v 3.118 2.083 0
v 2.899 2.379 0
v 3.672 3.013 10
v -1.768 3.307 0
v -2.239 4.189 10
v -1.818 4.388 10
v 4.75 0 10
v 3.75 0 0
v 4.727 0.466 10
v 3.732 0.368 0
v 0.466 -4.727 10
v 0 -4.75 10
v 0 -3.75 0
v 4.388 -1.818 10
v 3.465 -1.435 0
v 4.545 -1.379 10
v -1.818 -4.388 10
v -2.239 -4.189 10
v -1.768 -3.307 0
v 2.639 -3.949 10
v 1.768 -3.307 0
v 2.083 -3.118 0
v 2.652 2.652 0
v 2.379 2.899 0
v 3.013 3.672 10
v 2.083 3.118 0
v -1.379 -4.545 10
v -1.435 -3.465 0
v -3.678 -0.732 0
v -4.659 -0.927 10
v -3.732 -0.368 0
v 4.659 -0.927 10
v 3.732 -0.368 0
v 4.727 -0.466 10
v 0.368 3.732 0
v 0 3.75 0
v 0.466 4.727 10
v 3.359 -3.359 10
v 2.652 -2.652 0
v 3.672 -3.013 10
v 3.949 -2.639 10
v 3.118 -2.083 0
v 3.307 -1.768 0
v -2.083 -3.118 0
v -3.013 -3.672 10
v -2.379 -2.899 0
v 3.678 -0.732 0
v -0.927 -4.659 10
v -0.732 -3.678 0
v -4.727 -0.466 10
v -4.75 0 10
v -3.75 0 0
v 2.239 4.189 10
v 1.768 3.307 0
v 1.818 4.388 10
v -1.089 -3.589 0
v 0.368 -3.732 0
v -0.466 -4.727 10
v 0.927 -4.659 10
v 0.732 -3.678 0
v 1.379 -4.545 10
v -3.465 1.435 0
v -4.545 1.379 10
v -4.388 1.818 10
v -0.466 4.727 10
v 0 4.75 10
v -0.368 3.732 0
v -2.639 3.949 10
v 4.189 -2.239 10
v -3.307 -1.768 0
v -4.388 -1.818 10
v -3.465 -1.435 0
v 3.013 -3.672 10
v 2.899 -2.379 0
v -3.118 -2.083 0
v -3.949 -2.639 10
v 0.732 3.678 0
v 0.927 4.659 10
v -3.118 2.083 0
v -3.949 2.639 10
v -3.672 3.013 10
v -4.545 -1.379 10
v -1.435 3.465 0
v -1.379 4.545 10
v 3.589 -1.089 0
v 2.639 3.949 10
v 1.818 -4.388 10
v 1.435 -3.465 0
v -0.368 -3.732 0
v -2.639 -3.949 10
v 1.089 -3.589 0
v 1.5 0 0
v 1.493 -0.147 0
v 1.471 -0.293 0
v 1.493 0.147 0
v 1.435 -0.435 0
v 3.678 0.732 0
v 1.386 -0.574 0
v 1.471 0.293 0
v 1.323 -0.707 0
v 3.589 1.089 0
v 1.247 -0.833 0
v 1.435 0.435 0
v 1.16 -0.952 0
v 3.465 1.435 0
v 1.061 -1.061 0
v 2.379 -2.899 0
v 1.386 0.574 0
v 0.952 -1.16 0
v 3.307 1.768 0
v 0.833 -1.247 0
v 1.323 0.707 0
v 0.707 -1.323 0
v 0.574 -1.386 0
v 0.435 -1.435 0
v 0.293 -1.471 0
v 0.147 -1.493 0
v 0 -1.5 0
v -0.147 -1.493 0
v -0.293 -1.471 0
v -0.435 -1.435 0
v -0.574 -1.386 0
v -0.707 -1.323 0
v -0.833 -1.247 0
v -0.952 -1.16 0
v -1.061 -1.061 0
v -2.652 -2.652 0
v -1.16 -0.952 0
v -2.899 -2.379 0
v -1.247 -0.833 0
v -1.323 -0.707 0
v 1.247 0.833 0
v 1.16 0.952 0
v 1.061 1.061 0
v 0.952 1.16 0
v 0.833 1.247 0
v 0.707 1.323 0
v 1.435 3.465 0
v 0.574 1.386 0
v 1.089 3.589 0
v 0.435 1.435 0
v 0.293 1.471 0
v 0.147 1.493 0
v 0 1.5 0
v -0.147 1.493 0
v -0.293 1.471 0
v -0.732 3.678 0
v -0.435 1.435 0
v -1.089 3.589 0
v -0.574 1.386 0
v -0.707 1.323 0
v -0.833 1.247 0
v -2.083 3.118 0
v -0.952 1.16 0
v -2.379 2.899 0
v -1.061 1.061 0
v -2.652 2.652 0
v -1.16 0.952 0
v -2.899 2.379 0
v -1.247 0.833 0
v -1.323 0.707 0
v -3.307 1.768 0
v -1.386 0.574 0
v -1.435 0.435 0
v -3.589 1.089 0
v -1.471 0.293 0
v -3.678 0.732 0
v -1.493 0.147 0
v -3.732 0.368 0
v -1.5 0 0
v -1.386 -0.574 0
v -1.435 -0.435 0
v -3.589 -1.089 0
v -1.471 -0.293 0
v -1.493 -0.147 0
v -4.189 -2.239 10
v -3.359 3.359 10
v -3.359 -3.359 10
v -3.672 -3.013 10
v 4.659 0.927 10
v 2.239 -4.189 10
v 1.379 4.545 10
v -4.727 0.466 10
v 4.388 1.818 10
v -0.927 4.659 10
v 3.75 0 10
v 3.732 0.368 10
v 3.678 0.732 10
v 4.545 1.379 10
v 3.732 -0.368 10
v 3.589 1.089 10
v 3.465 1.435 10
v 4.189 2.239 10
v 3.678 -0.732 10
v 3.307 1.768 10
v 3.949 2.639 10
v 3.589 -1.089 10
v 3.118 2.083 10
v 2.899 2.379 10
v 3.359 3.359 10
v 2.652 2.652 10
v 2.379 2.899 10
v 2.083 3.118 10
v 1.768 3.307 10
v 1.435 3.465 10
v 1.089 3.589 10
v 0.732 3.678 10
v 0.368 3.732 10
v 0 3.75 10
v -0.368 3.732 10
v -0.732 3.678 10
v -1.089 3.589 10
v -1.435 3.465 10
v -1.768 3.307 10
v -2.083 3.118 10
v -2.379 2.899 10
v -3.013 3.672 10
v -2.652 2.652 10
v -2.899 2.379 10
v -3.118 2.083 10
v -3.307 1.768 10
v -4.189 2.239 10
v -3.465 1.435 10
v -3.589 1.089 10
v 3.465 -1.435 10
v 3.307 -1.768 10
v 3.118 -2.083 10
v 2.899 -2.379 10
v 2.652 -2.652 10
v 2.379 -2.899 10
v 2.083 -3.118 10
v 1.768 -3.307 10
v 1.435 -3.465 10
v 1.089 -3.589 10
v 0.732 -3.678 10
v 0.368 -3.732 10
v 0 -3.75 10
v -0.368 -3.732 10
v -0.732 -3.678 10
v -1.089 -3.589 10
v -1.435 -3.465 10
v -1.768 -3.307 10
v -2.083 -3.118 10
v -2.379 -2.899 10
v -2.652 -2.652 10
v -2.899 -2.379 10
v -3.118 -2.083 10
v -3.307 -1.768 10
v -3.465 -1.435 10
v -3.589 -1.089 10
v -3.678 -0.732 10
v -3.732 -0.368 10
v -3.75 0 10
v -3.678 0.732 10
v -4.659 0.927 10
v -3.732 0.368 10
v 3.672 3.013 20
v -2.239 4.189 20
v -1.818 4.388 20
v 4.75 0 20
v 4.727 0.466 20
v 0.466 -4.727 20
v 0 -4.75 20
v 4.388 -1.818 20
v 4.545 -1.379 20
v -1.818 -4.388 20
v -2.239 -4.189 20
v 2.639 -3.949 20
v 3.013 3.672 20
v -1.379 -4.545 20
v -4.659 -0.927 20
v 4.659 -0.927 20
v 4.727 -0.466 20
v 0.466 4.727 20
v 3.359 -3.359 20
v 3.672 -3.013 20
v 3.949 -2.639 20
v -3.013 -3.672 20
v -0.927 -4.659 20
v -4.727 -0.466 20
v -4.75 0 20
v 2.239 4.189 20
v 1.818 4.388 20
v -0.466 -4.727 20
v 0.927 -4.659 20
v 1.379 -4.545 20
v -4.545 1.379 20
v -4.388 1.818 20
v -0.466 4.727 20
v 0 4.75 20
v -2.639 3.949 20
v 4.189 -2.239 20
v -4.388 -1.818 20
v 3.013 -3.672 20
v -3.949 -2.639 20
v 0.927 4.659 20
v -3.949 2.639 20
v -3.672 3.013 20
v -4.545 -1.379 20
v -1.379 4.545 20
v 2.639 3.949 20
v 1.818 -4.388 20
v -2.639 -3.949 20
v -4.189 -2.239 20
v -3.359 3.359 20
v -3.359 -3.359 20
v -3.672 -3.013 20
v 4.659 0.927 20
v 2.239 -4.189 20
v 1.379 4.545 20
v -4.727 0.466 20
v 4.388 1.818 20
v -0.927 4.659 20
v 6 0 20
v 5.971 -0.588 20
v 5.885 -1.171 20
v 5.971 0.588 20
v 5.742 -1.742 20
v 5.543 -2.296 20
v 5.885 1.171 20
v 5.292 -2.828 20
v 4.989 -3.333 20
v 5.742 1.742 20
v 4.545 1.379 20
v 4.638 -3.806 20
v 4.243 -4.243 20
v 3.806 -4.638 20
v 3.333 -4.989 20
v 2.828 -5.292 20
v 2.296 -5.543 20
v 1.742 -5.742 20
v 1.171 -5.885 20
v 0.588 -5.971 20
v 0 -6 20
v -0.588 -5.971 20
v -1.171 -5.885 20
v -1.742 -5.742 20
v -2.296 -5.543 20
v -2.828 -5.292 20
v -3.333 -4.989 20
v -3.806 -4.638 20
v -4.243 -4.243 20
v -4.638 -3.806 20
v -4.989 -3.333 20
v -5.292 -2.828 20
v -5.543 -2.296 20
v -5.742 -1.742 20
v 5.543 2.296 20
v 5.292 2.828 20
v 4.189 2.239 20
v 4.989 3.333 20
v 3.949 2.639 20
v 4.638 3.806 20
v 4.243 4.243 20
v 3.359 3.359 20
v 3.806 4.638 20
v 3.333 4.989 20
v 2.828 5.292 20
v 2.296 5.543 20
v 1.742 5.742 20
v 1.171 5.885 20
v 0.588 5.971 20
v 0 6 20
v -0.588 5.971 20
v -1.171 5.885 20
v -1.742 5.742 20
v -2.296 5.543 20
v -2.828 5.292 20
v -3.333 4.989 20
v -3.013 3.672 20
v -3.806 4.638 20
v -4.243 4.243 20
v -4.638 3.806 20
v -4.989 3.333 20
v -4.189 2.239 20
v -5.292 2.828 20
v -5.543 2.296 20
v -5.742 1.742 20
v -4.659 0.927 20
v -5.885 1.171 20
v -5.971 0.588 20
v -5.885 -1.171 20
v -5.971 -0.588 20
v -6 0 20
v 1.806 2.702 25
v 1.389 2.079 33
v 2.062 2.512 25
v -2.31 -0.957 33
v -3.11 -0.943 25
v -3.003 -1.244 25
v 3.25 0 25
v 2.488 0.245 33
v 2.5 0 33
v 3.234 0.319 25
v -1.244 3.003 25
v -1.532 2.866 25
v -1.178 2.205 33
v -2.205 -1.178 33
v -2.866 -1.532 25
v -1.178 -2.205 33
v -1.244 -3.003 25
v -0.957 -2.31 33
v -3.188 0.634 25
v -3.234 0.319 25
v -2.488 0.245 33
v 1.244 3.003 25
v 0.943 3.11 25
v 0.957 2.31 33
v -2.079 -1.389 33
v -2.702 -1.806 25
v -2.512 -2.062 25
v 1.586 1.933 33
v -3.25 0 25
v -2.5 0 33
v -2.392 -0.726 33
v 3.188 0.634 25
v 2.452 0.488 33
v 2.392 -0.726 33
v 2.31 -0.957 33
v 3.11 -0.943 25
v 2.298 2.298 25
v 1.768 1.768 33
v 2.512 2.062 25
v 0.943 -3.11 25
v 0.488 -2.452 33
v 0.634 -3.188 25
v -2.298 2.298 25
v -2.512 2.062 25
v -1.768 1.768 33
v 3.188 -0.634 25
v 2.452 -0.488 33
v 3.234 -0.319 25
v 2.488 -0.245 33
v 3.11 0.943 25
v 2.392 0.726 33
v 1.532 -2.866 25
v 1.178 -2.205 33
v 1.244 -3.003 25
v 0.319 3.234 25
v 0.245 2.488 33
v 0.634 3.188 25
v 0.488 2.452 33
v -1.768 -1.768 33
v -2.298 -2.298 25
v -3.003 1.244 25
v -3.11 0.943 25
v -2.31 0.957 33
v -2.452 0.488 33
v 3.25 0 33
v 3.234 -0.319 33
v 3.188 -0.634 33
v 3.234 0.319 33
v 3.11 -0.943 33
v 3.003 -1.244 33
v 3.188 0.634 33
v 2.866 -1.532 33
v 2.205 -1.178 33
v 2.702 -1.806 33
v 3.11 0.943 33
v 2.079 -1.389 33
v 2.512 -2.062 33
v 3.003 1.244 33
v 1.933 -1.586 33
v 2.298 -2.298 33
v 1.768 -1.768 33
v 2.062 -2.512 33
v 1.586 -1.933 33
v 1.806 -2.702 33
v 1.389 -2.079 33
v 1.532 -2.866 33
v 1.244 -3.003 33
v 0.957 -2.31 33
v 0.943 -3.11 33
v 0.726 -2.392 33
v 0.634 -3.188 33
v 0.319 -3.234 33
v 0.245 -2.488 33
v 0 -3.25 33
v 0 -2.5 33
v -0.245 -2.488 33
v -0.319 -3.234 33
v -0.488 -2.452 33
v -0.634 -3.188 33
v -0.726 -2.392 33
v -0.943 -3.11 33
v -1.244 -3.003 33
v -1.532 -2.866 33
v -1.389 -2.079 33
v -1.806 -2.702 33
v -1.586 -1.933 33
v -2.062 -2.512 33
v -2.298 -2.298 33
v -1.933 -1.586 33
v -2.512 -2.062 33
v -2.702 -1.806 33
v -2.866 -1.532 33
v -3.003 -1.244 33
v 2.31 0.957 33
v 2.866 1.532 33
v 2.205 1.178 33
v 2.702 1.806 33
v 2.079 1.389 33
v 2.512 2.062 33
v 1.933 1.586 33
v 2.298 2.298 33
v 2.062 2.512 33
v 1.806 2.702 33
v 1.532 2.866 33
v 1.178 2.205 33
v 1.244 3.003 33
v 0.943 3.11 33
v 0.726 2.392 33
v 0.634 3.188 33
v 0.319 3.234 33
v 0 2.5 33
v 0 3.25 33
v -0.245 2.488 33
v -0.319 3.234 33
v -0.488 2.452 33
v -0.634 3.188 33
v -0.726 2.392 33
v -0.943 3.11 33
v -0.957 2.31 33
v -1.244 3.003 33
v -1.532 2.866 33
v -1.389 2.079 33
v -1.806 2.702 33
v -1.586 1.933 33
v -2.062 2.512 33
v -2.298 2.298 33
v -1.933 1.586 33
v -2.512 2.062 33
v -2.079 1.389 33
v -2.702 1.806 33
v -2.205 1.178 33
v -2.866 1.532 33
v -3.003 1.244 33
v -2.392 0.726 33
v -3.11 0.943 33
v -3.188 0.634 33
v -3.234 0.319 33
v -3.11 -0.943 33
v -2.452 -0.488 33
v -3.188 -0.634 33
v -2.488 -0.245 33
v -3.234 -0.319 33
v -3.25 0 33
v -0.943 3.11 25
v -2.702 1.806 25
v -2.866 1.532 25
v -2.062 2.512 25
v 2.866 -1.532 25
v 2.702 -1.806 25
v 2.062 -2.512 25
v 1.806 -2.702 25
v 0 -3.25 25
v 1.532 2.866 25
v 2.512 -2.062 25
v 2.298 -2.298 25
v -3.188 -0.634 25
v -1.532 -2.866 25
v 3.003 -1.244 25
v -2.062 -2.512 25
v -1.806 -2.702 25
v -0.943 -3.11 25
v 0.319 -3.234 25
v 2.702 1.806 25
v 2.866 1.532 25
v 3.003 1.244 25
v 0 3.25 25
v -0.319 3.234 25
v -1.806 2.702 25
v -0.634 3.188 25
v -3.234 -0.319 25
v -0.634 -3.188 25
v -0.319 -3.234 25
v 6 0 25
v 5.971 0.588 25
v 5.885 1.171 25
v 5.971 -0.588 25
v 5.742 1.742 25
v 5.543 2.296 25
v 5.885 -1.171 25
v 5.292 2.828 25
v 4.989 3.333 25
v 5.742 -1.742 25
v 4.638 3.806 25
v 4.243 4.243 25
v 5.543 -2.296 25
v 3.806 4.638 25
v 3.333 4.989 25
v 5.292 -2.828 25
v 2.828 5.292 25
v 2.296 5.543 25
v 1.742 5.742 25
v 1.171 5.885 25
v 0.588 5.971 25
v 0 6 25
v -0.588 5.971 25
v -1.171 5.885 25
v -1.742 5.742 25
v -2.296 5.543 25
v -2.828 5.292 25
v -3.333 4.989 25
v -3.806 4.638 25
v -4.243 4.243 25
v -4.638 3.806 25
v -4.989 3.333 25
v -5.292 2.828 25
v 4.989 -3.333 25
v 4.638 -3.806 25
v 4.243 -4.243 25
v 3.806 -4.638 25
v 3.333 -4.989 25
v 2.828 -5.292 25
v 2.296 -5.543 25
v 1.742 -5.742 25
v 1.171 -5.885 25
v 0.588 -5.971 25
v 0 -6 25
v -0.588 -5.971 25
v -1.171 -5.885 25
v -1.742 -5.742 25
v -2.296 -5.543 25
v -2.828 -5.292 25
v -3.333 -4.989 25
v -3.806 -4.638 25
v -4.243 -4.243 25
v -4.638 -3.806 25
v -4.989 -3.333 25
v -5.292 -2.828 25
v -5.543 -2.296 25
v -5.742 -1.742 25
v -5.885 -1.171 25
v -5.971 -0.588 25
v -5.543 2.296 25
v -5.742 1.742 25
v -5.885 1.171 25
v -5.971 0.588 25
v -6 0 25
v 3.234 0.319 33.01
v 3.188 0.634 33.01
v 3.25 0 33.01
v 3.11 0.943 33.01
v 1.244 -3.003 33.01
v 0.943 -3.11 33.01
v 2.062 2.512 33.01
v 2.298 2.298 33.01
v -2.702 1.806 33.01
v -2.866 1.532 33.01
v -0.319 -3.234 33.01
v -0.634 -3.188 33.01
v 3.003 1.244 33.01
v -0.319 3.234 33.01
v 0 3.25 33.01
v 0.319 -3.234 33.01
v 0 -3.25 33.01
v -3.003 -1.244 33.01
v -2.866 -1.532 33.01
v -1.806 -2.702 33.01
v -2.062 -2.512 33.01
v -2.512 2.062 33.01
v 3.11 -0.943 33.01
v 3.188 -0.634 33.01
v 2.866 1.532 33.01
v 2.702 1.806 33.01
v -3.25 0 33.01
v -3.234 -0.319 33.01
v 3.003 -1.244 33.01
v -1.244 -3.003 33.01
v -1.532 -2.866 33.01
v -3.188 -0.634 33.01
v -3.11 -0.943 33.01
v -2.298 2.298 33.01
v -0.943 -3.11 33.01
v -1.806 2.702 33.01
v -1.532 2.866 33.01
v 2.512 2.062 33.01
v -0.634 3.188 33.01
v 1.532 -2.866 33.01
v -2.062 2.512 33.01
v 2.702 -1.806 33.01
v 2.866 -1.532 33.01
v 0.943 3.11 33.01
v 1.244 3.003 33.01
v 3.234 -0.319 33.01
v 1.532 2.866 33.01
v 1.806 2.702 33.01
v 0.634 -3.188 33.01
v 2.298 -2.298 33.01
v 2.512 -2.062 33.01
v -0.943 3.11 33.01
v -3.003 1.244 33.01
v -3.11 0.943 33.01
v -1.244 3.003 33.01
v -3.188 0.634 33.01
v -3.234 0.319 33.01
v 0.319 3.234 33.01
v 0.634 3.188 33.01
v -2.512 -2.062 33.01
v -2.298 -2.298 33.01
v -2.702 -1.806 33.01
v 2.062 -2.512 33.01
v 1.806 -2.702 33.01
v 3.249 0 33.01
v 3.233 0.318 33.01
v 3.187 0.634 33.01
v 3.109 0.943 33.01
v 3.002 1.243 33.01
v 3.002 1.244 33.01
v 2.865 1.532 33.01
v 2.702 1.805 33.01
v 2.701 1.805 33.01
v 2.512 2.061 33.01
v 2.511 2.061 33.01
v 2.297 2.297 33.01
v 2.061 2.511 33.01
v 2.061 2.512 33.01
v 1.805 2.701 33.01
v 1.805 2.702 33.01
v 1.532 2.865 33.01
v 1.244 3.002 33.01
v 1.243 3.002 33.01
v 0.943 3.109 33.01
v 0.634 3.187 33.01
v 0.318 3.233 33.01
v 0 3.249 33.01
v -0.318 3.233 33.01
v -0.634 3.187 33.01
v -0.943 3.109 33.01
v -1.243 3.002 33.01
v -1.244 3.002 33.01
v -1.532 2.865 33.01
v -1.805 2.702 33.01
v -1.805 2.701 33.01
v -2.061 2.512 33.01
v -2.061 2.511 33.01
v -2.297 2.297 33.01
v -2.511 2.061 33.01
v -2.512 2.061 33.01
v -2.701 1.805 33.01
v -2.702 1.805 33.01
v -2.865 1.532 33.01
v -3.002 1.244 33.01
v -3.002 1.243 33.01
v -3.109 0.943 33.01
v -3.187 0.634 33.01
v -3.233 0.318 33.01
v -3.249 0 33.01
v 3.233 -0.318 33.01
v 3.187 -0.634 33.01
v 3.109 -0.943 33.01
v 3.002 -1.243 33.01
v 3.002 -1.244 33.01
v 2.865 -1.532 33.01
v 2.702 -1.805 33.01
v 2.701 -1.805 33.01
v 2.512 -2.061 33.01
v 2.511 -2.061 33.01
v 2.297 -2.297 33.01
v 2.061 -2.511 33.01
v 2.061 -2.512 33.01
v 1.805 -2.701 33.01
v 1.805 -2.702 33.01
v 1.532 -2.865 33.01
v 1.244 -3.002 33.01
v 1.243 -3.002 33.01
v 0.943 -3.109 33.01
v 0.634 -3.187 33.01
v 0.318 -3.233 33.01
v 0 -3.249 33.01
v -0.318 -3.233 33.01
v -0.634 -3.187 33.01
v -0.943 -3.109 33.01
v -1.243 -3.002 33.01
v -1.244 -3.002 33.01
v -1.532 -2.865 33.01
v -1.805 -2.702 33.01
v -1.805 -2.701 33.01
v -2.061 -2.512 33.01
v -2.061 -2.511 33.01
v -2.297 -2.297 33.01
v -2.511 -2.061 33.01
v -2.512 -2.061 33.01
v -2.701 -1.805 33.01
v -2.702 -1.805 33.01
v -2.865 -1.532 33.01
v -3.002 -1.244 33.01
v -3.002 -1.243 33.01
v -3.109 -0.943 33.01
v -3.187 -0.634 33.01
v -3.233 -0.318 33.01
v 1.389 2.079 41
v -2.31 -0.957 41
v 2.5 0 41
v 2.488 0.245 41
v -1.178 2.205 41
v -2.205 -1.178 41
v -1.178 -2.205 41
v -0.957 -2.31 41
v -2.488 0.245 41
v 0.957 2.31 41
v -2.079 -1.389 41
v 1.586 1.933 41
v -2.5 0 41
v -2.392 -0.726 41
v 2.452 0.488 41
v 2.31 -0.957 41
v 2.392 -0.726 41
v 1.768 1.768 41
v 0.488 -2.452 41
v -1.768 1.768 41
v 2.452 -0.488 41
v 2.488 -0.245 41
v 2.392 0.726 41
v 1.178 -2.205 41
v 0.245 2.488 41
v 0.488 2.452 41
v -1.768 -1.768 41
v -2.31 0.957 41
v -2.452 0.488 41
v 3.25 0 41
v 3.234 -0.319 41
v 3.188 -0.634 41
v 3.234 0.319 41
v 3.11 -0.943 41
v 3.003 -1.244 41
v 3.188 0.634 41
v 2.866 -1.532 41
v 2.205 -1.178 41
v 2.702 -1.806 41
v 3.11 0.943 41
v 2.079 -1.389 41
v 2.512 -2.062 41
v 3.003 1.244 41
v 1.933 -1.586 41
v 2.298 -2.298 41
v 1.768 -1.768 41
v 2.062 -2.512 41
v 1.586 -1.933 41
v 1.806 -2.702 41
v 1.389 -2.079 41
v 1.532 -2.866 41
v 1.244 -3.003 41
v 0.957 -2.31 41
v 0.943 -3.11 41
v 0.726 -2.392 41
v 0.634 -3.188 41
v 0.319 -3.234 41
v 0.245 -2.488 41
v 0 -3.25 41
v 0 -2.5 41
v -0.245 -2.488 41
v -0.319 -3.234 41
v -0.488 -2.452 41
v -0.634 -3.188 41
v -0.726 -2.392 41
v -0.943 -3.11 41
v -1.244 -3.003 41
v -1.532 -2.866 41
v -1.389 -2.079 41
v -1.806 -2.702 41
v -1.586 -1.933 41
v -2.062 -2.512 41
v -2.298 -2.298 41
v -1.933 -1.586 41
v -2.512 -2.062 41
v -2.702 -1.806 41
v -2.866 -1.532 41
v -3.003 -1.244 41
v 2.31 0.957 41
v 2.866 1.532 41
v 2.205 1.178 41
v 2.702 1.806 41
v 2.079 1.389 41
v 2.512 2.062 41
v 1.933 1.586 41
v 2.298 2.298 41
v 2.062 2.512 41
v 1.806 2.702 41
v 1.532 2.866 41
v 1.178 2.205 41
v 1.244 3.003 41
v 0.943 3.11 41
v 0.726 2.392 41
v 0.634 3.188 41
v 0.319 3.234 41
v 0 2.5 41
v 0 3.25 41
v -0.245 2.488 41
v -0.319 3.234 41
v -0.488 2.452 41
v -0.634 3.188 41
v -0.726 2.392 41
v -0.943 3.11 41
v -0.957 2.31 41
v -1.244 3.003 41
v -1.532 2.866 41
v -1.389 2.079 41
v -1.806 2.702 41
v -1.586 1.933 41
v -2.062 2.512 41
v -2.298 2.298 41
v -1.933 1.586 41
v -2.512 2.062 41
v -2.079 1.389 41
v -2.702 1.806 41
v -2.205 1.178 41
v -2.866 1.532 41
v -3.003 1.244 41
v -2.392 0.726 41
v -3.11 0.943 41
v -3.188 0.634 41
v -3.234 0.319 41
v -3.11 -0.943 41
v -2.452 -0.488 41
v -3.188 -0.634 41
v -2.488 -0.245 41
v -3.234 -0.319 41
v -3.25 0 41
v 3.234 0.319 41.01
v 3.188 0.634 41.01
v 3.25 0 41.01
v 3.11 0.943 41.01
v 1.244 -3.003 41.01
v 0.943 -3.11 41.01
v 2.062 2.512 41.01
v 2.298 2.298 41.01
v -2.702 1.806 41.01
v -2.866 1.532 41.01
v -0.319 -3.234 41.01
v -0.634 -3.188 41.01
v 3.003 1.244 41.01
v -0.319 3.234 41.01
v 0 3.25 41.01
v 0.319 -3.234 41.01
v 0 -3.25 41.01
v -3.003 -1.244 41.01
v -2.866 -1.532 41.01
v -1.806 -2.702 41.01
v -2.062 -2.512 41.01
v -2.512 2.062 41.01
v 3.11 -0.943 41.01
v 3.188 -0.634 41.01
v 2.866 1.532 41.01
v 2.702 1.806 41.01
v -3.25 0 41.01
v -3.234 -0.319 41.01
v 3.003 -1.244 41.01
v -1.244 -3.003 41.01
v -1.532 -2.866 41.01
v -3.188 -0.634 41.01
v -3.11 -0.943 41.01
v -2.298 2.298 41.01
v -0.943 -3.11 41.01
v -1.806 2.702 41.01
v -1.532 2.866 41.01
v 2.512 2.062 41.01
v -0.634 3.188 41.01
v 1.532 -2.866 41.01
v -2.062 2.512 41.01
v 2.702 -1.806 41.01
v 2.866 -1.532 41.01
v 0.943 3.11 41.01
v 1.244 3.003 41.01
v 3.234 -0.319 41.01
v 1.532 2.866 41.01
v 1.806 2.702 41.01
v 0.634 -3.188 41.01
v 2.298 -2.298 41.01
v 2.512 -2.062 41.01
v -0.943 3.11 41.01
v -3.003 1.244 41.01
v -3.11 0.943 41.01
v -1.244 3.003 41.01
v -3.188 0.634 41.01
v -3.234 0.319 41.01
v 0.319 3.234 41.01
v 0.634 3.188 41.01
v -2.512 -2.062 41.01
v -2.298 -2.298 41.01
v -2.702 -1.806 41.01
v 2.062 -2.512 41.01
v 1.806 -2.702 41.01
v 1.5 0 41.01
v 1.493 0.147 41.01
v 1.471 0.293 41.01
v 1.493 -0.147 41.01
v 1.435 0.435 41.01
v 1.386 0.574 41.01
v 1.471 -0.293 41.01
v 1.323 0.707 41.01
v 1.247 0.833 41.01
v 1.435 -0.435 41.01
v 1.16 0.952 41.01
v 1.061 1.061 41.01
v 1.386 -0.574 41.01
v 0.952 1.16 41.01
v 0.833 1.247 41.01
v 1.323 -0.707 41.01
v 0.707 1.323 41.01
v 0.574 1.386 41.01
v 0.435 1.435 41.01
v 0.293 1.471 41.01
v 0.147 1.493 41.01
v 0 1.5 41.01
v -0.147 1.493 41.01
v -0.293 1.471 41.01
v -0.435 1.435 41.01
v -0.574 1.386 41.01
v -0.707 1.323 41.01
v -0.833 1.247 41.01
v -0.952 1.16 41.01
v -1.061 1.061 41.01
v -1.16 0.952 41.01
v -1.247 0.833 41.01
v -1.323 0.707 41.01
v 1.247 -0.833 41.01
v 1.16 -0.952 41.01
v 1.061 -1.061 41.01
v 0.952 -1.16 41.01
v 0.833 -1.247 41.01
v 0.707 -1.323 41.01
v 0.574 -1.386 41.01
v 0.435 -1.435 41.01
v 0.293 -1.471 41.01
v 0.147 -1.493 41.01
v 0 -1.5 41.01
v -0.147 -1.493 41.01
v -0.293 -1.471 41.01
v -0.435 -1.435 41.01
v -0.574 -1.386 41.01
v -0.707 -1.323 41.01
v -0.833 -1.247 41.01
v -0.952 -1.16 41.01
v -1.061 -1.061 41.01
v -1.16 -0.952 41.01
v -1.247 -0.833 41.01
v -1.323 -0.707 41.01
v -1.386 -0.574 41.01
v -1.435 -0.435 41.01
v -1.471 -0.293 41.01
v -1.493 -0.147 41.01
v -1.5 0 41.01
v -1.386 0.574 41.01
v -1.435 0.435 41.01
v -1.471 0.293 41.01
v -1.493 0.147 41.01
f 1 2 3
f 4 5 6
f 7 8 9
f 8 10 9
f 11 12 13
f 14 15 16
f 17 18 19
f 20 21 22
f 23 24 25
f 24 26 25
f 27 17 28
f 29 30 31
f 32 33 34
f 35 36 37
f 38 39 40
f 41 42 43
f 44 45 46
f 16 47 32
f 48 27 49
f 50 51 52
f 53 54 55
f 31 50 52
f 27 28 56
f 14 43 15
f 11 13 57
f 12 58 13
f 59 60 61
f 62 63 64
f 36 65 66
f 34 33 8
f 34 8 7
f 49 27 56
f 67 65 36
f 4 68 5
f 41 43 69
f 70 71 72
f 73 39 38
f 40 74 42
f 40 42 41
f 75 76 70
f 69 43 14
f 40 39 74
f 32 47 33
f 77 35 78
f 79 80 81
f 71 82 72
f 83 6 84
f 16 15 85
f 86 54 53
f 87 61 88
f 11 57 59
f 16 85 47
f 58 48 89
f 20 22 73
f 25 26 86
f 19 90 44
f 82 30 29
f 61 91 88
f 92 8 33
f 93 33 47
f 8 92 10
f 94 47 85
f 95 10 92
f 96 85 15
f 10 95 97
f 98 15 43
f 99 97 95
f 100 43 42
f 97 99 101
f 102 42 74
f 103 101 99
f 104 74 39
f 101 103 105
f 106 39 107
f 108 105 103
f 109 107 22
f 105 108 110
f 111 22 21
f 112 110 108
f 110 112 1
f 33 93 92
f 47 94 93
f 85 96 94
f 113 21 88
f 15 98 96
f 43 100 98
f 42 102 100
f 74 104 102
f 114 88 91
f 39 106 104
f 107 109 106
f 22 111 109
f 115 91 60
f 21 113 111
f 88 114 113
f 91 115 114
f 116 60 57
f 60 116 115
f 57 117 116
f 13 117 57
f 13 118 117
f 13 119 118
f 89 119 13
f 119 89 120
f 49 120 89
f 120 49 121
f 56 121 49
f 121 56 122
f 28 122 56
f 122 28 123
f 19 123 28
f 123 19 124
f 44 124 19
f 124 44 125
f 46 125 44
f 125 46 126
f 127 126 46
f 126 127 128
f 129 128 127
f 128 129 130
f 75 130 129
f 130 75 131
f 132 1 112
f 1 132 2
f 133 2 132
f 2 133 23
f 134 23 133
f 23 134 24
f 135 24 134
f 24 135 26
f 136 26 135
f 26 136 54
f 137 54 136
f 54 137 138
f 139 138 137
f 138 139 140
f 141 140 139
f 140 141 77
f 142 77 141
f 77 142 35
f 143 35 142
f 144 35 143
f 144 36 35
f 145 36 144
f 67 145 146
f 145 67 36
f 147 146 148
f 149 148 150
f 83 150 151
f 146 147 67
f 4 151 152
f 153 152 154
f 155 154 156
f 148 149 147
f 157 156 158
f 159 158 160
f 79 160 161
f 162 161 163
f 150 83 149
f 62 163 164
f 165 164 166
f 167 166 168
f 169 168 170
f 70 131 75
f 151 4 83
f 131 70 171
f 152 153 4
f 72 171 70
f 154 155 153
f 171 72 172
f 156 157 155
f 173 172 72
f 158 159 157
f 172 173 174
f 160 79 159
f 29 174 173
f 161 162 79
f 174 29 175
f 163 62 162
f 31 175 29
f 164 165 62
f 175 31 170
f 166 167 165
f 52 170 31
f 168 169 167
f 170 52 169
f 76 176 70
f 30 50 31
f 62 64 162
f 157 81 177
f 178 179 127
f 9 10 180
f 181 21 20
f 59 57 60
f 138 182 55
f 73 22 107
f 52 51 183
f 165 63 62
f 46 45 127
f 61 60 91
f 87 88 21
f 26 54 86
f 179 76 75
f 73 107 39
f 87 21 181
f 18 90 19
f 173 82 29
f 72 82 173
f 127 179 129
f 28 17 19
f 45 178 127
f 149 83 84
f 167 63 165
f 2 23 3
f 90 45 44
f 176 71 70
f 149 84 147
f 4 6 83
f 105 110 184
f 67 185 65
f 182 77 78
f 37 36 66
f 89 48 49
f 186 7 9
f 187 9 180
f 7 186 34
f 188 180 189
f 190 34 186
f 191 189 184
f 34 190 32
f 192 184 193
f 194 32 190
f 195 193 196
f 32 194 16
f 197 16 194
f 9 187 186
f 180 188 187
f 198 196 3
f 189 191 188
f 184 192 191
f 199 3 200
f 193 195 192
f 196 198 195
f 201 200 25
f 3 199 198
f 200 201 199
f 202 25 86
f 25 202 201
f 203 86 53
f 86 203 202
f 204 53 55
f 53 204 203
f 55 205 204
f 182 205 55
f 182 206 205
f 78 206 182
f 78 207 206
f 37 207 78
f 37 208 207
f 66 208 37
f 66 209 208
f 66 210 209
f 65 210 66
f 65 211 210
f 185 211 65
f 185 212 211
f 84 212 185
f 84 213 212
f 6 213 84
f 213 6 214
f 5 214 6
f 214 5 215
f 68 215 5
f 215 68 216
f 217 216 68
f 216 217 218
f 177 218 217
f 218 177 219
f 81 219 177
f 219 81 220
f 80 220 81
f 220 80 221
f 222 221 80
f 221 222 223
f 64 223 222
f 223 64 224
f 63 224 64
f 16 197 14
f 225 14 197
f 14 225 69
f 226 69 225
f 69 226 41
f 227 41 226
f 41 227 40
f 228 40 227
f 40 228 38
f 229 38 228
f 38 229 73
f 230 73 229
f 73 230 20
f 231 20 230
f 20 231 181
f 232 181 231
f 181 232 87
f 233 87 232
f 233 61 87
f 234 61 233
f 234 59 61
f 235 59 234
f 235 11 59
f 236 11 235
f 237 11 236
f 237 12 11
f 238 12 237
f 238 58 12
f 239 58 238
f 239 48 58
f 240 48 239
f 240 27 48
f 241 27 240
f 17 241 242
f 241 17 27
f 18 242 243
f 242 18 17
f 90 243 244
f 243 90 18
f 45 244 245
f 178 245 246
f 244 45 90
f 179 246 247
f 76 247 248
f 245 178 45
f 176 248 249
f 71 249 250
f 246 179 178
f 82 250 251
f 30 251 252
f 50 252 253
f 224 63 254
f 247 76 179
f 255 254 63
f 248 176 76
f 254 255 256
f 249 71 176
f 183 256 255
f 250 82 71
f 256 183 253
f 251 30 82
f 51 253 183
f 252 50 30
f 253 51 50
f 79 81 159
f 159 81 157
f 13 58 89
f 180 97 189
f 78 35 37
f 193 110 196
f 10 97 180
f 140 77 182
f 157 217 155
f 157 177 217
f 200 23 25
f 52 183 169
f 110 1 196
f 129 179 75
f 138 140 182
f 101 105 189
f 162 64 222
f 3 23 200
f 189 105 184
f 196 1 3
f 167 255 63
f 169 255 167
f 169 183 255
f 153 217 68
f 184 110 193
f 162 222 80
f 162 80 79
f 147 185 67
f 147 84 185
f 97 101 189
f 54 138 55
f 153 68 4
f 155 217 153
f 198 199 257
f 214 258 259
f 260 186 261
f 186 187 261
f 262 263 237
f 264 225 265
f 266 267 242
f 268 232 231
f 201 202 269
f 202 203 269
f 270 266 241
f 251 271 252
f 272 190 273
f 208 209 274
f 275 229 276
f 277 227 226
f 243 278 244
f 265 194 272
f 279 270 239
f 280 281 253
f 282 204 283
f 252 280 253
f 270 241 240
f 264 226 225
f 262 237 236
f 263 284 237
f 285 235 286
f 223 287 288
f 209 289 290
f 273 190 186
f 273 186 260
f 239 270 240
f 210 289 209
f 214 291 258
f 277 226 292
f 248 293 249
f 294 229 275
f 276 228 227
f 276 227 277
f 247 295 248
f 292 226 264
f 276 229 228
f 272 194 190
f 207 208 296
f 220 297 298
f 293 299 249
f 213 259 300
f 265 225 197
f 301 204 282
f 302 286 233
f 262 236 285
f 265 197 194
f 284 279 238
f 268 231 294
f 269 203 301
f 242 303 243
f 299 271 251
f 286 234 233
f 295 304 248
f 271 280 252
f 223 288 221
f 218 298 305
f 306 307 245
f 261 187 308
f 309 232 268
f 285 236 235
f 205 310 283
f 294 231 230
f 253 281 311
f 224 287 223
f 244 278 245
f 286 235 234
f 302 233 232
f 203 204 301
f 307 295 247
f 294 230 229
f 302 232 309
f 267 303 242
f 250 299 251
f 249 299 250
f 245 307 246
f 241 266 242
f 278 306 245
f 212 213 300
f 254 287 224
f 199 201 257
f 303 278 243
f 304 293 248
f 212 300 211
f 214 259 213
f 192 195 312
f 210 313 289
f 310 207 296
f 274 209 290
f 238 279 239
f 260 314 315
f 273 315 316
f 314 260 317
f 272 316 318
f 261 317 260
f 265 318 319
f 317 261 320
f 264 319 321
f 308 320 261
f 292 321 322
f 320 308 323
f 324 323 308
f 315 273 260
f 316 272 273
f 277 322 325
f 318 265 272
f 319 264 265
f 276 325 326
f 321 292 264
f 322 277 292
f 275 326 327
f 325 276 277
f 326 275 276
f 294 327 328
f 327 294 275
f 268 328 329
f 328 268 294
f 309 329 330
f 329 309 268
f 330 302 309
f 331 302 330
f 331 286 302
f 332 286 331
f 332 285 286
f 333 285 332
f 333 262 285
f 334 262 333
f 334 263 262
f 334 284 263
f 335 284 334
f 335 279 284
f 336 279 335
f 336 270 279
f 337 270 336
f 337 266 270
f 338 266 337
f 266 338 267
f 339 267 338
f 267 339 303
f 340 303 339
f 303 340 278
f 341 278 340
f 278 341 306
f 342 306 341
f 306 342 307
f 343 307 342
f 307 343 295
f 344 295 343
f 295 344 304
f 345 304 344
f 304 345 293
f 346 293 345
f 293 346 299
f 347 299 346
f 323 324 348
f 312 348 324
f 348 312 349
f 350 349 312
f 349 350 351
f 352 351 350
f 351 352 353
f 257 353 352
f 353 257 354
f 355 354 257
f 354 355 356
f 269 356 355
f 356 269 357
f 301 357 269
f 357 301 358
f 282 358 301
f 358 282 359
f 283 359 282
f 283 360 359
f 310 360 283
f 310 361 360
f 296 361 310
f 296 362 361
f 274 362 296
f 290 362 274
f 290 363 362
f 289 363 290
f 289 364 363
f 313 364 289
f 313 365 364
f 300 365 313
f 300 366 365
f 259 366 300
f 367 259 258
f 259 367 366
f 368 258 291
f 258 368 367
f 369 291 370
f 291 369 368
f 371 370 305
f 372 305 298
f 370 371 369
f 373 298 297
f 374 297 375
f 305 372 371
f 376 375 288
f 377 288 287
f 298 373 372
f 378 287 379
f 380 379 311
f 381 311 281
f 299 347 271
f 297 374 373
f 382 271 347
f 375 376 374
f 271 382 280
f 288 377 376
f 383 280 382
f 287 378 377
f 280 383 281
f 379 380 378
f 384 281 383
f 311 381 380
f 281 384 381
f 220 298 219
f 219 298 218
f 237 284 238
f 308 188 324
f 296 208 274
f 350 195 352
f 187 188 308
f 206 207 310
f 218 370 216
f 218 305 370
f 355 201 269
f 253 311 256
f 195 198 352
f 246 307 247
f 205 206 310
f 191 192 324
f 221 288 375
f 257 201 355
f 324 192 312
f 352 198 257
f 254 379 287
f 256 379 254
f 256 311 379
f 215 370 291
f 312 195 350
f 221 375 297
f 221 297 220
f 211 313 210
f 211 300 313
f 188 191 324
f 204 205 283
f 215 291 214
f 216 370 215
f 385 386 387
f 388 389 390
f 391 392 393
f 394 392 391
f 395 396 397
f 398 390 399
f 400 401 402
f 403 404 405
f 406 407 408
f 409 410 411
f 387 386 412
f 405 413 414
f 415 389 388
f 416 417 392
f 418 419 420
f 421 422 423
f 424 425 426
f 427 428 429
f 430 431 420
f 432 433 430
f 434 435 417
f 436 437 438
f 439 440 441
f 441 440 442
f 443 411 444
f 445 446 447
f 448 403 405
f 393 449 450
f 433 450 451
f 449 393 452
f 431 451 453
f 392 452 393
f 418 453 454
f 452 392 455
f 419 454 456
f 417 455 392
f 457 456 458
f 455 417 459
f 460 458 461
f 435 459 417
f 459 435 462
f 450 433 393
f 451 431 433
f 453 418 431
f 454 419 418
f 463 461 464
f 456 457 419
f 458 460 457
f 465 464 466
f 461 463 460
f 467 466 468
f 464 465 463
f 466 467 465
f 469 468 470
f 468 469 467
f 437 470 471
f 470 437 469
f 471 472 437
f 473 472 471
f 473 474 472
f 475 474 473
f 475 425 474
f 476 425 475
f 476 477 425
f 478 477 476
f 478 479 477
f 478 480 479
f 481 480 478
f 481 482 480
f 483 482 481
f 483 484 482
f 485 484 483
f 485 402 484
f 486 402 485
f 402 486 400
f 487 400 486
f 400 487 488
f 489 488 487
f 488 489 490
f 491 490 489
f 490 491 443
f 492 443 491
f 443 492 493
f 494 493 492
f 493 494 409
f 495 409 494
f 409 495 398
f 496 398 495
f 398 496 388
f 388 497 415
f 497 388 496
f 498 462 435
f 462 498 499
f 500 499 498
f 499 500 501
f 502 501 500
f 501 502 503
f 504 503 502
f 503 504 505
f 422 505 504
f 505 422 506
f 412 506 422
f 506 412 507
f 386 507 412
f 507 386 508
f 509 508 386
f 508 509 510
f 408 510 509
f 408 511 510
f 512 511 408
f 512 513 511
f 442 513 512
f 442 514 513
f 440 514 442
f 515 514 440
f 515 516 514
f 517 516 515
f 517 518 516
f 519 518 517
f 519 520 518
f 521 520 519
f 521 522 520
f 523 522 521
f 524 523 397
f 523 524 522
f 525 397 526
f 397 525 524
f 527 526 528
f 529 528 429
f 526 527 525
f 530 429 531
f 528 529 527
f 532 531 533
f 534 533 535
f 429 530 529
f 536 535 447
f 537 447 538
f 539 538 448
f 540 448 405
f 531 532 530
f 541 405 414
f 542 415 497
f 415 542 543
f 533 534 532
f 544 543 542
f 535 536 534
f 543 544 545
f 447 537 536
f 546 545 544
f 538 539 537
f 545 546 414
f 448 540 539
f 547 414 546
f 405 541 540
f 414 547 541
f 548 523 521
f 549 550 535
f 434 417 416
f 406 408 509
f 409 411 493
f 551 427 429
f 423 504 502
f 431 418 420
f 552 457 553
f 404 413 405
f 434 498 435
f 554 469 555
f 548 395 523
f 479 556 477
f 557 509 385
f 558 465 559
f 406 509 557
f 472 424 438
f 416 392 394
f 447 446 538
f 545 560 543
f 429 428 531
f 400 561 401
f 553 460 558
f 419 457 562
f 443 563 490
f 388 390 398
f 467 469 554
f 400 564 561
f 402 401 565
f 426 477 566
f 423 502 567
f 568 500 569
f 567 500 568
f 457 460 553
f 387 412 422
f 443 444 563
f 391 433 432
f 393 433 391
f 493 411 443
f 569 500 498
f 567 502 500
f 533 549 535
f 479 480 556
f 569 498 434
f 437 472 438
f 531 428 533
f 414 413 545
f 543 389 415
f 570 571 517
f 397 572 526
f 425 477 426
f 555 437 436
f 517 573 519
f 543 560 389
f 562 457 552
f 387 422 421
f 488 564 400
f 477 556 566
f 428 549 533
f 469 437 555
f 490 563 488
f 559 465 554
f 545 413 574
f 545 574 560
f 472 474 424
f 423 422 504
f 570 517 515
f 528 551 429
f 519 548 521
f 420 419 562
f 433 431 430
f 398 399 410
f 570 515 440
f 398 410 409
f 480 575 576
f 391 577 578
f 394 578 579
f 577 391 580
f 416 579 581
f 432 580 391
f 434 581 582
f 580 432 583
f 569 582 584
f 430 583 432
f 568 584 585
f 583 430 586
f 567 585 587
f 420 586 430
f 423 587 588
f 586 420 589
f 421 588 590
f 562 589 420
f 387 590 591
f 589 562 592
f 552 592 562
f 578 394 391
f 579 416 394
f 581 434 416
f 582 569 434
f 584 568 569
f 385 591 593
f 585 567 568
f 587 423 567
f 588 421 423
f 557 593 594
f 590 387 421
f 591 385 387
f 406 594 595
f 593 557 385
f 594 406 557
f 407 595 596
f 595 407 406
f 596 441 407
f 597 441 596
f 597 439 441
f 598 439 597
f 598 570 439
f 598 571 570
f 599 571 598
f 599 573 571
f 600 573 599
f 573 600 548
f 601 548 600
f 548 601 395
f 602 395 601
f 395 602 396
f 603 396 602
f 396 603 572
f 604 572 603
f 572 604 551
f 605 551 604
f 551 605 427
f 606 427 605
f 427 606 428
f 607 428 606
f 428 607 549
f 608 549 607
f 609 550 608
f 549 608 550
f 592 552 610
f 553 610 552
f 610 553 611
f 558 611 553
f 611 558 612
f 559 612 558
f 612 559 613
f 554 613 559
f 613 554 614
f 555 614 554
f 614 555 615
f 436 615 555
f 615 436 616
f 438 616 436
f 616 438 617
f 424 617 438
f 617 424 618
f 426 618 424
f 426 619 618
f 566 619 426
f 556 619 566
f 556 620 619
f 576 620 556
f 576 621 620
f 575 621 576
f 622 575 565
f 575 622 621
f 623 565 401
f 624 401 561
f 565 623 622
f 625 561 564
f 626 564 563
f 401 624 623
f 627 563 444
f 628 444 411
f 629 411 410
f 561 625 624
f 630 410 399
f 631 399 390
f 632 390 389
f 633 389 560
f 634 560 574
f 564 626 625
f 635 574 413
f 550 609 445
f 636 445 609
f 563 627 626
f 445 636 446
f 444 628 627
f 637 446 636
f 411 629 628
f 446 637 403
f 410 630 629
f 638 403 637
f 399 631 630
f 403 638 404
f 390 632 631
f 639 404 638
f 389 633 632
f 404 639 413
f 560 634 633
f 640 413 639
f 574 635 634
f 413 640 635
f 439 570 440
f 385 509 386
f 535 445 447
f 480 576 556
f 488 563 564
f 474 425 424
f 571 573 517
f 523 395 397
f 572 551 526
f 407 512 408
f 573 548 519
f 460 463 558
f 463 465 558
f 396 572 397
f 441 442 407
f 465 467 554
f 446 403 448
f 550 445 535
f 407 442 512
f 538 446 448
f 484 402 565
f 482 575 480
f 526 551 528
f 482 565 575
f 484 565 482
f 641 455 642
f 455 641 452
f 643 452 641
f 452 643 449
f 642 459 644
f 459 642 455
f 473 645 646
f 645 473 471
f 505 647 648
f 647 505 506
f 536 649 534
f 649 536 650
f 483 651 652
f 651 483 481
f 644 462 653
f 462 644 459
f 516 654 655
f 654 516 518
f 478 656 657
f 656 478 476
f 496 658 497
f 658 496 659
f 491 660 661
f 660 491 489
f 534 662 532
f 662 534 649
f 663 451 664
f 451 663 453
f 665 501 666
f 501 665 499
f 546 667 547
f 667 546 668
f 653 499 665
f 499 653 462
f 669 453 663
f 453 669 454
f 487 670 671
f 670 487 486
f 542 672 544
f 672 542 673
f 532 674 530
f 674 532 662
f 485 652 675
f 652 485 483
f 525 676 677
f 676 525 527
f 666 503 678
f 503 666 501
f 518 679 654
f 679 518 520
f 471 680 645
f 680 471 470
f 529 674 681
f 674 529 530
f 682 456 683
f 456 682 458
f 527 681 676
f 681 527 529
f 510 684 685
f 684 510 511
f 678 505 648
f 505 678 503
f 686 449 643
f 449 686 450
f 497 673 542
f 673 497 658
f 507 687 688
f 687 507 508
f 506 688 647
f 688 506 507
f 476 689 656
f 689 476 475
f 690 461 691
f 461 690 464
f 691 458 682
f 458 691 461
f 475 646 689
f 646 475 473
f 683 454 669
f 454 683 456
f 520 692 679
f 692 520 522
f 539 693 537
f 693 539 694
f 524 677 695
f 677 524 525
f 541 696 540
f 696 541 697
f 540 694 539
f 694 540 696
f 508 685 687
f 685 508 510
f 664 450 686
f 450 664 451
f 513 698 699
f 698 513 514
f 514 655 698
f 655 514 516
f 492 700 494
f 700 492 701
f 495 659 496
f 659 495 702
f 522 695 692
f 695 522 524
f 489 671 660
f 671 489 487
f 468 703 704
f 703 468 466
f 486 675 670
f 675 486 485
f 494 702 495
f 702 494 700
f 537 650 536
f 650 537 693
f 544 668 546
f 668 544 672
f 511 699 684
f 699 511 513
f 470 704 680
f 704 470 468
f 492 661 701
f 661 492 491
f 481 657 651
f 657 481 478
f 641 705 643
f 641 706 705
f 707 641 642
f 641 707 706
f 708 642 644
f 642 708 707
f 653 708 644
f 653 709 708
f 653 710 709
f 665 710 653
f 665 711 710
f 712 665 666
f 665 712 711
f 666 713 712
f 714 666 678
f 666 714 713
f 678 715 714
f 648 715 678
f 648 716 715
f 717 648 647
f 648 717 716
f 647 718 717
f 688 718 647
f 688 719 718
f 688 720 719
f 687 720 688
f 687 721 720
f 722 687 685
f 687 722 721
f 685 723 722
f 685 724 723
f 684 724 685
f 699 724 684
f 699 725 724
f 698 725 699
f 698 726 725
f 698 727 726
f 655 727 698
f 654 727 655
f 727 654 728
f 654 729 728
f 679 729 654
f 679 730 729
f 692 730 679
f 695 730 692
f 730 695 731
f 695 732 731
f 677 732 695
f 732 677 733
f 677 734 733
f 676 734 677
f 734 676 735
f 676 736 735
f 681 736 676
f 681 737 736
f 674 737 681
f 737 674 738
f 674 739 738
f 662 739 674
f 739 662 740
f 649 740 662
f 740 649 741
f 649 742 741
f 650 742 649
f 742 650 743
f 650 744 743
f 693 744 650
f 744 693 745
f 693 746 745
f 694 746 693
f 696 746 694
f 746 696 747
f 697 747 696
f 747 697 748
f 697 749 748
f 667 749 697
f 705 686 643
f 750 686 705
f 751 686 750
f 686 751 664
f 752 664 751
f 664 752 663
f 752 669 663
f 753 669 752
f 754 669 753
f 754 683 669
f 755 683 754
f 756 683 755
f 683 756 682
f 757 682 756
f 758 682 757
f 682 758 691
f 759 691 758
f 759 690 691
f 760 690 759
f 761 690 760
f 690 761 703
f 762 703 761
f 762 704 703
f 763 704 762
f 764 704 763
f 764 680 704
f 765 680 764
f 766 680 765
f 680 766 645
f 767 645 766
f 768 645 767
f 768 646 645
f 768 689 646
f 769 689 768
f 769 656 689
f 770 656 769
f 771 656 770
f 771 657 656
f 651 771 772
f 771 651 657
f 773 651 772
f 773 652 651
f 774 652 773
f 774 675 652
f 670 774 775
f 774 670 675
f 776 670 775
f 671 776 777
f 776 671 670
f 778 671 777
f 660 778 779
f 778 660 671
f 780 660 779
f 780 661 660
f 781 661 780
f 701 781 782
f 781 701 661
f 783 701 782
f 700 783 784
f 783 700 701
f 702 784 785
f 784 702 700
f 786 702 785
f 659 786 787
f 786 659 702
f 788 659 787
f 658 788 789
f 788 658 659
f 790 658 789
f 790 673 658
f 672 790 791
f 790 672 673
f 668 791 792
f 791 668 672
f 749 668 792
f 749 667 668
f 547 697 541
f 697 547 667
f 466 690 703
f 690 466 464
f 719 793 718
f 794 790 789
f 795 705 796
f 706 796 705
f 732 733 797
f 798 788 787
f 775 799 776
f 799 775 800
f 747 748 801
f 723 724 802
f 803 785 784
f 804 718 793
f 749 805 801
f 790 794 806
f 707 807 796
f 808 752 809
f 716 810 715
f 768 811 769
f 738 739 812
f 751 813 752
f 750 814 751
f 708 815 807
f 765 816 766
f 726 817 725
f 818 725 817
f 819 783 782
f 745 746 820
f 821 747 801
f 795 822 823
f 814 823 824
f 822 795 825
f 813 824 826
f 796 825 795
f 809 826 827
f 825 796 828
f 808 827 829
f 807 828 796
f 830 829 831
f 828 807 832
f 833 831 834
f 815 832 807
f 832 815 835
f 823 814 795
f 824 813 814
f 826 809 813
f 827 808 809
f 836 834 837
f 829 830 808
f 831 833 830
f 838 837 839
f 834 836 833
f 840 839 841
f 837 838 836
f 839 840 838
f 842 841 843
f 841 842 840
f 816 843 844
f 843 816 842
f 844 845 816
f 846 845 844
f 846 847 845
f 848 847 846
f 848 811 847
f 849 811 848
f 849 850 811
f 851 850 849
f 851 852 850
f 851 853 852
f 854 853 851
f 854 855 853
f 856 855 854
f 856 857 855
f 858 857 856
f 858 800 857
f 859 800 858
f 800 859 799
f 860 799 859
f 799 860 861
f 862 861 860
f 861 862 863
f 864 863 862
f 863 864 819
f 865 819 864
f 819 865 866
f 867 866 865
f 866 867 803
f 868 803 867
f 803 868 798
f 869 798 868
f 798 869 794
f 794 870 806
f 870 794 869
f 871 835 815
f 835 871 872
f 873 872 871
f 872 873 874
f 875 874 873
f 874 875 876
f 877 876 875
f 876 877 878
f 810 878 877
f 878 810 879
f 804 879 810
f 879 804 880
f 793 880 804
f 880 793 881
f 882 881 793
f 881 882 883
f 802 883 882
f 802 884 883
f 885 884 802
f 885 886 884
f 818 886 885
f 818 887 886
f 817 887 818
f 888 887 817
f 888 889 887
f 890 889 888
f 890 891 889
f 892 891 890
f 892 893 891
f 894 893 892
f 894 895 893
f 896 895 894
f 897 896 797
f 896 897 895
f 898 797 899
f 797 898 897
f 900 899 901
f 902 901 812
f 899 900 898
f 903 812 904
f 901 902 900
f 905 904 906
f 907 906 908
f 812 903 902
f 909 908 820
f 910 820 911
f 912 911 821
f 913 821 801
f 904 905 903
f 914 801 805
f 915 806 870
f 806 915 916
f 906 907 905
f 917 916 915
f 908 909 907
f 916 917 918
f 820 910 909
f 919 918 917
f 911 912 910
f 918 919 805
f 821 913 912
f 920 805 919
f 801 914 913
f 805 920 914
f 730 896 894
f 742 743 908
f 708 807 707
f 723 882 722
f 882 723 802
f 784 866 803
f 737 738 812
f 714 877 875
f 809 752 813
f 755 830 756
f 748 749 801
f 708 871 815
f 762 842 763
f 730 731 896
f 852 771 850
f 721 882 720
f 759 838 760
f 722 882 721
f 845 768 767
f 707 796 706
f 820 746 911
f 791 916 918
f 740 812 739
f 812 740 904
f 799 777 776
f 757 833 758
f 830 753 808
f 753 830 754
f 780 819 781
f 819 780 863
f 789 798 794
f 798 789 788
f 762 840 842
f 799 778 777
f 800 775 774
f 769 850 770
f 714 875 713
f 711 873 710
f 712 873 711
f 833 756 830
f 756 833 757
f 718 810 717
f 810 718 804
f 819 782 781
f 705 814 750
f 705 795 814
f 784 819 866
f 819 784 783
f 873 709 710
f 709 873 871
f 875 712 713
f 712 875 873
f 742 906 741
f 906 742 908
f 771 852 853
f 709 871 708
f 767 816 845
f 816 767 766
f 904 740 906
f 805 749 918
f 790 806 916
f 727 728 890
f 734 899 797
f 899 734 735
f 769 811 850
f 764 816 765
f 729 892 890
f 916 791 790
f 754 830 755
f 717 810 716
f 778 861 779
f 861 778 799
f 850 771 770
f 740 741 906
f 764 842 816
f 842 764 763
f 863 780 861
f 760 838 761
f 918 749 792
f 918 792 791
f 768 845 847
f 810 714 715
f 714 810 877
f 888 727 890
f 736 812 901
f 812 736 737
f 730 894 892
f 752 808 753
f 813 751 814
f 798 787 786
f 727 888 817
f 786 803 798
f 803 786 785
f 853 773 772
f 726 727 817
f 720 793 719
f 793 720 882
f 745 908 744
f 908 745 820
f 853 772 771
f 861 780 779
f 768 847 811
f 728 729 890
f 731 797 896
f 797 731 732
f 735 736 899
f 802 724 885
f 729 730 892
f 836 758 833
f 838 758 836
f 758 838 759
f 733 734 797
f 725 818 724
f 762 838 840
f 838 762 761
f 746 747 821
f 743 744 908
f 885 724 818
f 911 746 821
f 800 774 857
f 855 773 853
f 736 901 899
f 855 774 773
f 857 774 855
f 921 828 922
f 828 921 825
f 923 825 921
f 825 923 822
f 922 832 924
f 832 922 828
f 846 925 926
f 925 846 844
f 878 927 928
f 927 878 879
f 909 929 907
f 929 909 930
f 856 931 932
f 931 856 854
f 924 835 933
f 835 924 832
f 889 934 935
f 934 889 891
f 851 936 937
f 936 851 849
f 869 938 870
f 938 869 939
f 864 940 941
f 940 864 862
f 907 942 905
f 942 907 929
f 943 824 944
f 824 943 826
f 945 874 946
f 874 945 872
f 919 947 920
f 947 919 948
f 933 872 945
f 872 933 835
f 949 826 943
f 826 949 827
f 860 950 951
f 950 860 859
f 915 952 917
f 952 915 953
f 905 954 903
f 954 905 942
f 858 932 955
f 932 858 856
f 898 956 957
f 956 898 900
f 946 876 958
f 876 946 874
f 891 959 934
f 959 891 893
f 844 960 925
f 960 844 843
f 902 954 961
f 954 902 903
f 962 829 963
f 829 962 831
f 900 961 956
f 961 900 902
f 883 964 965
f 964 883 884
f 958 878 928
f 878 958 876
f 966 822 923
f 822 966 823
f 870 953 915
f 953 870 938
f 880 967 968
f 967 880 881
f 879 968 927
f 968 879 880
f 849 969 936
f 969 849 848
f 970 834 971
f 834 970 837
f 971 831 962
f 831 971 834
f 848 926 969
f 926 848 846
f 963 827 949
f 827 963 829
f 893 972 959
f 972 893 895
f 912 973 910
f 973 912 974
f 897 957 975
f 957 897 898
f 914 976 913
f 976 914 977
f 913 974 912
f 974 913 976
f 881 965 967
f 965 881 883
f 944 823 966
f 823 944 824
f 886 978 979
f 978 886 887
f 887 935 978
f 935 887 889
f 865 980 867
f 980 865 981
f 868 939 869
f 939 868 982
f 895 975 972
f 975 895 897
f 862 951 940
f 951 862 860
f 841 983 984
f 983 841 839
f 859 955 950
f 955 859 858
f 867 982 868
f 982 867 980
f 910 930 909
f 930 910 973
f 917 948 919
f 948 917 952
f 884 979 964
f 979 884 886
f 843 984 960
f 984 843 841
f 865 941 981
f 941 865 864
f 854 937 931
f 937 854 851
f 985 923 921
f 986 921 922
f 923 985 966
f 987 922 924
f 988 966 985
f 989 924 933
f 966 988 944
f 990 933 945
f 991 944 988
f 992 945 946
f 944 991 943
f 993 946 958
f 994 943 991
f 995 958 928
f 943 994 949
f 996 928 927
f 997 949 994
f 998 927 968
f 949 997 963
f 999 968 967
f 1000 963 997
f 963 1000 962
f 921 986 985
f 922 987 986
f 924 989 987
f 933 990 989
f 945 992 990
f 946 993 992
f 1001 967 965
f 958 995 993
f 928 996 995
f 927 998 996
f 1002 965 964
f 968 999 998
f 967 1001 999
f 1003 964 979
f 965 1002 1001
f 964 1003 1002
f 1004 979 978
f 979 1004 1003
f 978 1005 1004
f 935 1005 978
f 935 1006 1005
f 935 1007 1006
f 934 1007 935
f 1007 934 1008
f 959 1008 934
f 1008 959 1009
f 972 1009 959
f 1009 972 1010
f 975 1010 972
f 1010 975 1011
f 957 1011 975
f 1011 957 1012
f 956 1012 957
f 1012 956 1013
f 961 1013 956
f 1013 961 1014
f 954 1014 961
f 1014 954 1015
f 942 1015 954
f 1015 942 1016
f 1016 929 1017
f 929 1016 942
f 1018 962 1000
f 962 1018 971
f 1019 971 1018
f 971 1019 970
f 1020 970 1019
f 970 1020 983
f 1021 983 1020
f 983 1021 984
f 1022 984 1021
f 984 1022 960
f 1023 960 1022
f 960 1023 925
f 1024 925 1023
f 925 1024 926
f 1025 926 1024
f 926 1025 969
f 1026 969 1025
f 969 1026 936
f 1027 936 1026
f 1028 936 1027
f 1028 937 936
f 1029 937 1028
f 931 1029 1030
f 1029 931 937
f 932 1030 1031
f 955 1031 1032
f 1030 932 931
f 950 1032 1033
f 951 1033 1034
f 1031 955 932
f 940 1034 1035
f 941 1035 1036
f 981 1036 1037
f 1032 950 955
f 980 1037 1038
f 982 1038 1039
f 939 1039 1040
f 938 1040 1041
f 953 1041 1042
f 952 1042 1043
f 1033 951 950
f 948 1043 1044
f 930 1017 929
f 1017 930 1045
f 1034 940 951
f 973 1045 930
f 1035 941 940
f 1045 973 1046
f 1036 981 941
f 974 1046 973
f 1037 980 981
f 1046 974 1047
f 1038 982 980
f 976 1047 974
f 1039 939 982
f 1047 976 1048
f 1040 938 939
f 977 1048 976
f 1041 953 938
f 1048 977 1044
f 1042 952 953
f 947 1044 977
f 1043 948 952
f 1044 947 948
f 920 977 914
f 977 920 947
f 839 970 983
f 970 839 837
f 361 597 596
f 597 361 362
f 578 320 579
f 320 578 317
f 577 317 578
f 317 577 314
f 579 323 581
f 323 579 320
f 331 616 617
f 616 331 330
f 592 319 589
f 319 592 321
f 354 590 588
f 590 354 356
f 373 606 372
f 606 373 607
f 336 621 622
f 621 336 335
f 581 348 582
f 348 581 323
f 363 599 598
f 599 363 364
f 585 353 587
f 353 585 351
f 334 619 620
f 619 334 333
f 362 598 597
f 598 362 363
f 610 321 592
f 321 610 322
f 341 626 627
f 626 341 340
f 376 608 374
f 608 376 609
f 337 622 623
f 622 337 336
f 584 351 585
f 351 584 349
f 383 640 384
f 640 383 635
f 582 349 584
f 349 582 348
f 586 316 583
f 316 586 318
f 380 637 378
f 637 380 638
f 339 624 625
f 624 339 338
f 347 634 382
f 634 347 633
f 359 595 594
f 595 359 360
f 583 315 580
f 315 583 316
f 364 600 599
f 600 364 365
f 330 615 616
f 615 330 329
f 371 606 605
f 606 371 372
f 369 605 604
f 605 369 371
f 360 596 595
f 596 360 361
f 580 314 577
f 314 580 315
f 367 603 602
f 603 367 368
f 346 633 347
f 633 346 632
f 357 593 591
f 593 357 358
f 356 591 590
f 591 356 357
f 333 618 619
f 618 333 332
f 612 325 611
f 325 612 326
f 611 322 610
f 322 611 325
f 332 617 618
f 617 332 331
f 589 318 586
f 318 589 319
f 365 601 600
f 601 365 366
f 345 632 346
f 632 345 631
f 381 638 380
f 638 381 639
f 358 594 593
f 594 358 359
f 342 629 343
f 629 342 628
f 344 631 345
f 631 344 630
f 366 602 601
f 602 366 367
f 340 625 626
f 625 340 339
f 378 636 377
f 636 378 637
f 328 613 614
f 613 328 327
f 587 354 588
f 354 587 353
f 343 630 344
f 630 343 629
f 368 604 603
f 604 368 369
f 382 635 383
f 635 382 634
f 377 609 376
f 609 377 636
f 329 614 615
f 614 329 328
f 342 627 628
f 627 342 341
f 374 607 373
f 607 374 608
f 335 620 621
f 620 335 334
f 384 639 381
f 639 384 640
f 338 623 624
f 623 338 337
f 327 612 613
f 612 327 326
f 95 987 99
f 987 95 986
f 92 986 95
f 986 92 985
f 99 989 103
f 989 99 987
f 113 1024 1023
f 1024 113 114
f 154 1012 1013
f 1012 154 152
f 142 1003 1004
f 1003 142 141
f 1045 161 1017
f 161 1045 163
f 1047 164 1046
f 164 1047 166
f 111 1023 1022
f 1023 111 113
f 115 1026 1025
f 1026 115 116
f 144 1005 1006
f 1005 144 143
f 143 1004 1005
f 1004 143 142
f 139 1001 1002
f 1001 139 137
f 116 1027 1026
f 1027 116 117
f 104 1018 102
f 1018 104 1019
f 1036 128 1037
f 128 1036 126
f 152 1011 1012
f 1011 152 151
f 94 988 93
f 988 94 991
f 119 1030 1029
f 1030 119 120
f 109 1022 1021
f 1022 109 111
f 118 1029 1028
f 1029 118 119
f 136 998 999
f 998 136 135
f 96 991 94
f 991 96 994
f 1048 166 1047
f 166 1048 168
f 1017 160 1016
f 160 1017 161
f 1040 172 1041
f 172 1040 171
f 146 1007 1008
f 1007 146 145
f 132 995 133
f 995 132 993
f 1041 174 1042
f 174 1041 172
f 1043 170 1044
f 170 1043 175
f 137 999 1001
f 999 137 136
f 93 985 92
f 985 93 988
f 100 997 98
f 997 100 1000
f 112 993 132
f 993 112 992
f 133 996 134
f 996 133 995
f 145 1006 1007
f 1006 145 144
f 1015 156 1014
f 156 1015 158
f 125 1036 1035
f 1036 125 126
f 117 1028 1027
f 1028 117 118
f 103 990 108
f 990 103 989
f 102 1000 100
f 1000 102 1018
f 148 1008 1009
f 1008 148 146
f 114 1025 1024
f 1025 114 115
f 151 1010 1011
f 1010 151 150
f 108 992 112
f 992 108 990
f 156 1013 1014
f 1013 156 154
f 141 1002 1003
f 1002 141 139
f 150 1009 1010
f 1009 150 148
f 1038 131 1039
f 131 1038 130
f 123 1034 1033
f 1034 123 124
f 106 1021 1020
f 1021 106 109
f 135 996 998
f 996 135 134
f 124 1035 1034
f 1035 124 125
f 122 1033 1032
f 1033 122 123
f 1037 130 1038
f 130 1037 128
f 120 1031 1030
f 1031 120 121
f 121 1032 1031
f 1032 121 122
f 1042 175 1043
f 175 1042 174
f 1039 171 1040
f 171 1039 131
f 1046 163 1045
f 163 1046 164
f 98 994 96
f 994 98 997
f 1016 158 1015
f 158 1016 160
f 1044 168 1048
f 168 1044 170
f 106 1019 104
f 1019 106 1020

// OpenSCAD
// --- Dimensions ---
bore_diameter = 3.0;           // Internal bore diameter
barb_8_bottom_od = 7.5;        // 8mm tubing barb bottom OD
barb_8_top_od = 9.5;           // 8mm tubing barb top OD
barb_8_height = 10.0;          // Height of one 8mm barb
barb_8_count = 2;              // Number of 8mm barbs

collar_diameter = 12.0;        // Diameter of the middle collar
collar_height = 5.0;           // Height of the middle collar (25 - 20)

barb_5_bottom_od = 6.5;        // 5mm tubing barb bottom OD
barb_5_top_od = 5.0;           // 5mm tubing barb top OD
barb_5_height = 8.0;           // Height of one 5mm barb
barb_5_count = 2;              // Number of 5mm barbs

// --- Constants ---
$fn = 64;

// --- Helper Modules ---

// Module for the 8mm barb (Sawtooth profile: grows then steps back)
module barb_8_segment() {
    union() {
        // Tapered part
        cylinder(h = barb_8_height, d1 = barb_8_bottom_od, d2 = barb_8_top_od);
        // Step back part (the "sawtooth" shoulder)
        translate([0, 0, barb_8_height])
            cylinder(h = 0.01, d = barb_8_bottom_od);
    }
}

// Module for the 5mm barb (Sawtooth profile: shrinks then steps out)
module barb_5_segment() {
    union() {
        // Tapered part
        cylinder(h = barb_5_height, d1 = barb_5_bottom_od, d2 = barb_5_top_od);
        // Step out part (the "sawtooth" shoulder)
        translate([0, 0, barb_5_height])
            cylinder(h = 0.01, d = barb_5_bottom_od);
    }
}

// --- Main Assembly ---

module hose_barb_reducer() {
    difference() {
        union() {
            // 8mm Barb Section (Z = 0 to 20)
            for (i = [0 : barb_8_count - 1]) {
                translate([0, 0, i * barb_8_height])
                    barb_8_segment();
            }

            // Collar Section (Z = 20 to 25)
            translate([0, 0, 20])
                cylinder(h = collar_height, d = collar_diameter);

            // 5mm Barb Section (Z = 25 to 41)
            // Note: 25 + (2 * 8) = 41.
            for (i = [0 : barb_5_count - 1]) {
                translate([0, 0, 25 + (i * barb_5_height)])
                    barb_5_segment();
            }
        }

        // Internal Bore (Running through full length)
        // We extend the bore slightly beyond the total height to ensure a clean cut
        translate([0, 0, -1])
            cylinder(h = 45, d = bore_diameter);
    }
}

// Render the part
hose_barb_reducer();
